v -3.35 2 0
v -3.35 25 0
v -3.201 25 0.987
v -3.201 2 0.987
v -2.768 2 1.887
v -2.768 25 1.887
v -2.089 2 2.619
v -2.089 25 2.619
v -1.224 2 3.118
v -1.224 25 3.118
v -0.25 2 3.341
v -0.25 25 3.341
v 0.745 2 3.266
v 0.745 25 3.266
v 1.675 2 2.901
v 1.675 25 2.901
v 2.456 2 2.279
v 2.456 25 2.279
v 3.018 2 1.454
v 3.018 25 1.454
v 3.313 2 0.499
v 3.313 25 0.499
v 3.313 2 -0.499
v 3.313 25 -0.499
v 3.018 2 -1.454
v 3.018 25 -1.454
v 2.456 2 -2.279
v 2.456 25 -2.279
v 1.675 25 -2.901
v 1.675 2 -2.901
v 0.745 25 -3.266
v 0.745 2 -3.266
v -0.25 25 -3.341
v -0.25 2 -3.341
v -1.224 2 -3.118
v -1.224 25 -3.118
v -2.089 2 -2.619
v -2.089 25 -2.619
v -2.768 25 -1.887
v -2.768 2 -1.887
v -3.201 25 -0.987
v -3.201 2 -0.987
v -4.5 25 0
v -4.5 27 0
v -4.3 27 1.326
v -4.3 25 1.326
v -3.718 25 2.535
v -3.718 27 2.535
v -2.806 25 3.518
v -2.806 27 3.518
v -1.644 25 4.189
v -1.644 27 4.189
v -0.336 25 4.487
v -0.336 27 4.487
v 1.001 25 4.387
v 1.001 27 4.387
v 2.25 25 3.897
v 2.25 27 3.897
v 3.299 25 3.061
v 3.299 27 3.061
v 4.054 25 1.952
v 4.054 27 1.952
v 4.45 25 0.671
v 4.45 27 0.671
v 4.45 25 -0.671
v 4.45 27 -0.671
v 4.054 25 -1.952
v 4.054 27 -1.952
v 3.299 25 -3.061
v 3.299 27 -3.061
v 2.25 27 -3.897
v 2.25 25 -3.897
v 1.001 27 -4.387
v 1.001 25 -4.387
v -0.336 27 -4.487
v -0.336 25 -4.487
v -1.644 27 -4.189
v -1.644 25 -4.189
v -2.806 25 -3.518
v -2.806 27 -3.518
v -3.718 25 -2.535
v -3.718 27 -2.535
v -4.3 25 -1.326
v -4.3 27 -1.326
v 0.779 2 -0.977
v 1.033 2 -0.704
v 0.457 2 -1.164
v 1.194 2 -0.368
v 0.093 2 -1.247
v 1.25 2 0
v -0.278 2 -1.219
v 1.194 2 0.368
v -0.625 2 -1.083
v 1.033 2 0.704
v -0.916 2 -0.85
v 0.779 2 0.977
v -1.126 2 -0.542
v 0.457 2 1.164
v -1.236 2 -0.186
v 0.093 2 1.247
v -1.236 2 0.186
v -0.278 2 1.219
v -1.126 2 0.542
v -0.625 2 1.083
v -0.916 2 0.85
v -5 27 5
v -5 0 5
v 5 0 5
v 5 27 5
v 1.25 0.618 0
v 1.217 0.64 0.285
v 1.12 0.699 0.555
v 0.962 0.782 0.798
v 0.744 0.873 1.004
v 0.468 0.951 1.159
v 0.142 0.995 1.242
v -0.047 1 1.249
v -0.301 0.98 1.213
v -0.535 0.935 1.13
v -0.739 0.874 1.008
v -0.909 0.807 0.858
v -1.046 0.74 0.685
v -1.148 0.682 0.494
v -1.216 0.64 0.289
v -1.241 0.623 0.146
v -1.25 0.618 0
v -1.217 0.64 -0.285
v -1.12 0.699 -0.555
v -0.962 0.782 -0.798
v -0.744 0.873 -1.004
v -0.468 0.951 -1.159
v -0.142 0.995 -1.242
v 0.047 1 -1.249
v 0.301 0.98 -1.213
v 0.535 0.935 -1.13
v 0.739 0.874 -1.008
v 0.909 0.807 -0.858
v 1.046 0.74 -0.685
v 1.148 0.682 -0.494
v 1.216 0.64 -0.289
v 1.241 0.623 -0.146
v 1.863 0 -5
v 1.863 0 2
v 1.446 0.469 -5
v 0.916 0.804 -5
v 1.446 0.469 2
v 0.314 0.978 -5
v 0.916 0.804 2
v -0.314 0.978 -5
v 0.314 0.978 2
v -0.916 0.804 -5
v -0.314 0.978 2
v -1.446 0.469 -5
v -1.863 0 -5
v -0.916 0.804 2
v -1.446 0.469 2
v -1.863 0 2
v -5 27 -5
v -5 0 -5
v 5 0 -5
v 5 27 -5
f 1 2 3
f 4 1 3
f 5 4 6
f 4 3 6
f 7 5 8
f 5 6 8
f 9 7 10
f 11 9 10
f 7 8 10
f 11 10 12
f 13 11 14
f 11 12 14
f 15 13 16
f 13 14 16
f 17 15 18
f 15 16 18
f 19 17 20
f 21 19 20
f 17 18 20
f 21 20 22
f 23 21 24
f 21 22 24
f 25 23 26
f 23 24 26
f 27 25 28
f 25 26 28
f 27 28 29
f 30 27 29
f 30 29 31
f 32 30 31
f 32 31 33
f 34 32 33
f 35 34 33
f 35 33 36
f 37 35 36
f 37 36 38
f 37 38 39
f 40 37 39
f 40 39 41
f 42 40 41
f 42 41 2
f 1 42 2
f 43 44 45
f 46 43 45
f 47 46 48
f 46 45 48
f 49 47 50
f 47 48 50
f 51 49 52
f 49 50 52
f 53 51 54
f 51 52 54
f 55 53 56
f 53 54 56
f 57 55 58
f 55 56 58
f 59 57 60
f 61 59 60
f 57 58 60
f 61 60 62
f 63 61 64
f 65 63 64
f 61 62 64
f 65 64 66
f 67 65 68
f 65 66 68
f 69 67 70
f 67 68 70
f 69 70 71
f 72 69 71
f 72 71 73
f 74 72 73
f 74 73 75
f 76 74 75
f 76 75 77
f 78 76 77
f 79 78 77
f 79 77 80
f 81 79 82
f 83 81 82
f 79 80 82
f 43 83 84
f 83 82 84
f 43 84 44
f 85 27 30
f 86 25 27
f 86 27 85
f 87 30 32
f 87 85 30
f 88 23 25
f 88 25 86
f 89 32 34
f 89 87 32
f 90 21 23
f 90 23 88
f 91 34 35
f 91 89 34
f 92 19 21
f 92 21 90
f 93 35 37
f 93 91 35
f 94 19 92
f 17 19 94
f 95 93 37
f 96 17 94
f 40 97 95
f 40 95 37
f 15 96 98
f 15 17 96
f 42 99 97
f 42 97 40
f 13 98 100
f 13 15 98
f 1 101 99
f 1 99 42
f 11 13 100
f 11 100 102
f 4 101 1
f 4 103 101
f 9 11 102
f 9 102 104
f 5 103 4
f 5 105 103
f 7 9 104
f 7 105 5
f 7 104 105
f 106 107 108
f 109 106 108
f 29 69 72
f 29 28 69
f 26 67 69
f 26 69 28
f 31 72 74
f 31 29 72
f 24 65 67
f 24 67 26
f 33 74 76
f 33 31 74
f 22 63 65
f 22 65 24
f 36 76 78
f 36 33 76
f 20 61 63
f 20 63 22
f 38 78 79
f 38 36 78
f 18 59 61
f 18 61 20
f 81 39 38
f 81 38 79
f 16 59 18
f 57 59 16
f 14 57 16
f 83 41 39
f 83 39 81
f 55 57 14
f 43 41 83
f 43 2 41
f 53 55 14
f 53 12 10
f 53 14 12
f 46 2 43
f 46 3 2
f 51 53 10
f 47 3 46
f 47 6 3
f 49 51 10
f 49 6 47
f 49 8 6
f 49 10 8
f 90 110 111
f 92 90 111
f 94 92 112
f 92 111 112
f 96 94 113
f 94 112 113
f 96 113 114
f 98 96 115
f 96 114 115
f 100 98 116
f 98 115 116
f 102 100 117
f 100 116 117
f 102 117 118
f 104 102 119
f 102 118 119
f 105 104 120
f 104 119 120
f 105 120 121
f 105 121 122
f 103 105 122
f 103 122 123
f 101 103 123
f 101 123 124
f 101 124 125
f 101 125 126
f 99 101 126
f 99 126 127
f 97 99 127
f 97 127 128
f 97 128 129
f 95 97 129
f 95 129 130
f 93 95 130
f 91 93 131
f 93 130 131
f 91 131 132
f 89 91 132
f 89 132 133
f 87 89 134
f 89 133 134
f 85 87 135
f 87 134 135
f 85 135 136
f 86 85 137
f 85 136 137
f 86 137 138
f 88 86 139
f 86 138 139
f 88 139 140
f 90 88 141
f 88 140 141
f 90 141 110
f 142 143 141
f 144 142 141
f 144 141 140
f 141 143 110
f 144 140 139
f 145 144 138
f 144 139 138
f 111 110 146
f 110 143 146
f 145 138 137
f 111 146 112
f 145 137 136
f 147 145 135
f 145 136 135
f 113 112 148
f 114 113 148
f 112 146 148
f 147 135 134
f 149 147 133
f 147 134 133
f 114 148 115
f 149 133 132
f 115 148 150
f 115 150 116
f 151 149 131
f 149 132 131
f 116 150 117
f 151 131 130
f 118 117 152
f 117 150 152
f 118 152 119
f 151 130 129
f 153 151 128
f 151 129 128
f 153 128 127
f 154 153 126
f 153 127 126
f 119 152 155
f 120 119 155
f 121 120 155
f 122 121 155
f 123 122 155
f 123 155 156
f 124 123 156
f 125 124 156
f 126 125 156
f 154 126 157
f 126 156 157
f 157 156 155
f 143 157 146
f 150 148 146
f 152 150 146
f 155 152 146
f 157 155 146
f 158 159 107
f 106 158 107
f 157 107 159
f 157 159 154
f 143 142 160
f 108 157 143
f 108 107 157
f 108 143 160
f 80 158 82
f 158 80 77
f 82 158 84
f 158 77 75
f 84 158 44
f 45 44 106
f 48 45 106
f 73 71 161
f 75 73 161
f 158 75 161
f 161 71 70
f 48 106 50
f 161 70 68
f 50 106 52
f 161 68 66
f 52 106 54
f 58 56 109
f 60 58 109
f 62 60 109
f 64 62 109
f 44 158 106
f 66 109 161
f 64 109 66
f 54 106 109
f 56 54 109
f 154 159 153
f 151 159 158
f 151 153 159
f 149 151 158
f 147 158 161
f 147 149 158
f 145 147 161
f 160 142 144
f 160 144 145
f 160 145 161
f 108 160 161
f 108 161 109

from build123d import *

# Parameters (mm, degrees)
F0_W      = 10
F0_H      = 10
F1_DEPTH  = 27
F2_R      = 1.25
F3_DEPTH  = 25
F4_R      = 2.235
F5_DEPTH  = 25
F6_DEPTH  = 2
F7_R      = 3.35
F8_DEPTH  = 25
F9_R      = 4.5
F10_DEPTH = 2


with BuildPart() as f1:
    # F0 (on Front) → F1 (new body)
    with BuildSketch(Plane.XZ):
        Rectangle(F0_W, F0_H)
    extrude(amount=-F1_DEPTH)

    # F2 (on face) → F3 (cut)
    with BuildSketch(Plane.XZ):
        Circle(F2_R)
    extrude(amount=-F3_DEPTH, mode=Mode.SUBTRACT)

    # F4 (on Top) → F5 (cut)
    with BuildSketch(Plane.XY):
        with Locations((0, -1.235)):
            Circle(F4_R)
    extrude(amount=-F5_DEPTH, mode=Mode.SUBTRACT)

    # F4 (on Top) → F6 (cut)
    with BuildSketch(Plane.XY):
        with Locations((0, -1.235)):
            Circle(F4_R)
    extrude(amount=F6_DEPTH, mode=Mode.SUBTRACT)

    # F7 (on face) → F8 (cut)
    with BuildSketch(Plane(origin=(0, 27, 0), x_dir=(-1, 0, 0), z_dir=(0, 1, 0))):
        Circle(F7_R)
    extrude(amount=-F8_DEPTH, mode=Mode.SUBTRACT)

    # F9 (on face) → F10 (cut)
    with BuildSketch(Plane(origin=(0, 27, 0), x_dir=(-1, 0, 0), z_dir=(0, 1, 0))):
        Circle(F9_R)
    extrude(amount=-F10_DEPTH, mode=Mode.SUBTRACT)


solid = f1.part
